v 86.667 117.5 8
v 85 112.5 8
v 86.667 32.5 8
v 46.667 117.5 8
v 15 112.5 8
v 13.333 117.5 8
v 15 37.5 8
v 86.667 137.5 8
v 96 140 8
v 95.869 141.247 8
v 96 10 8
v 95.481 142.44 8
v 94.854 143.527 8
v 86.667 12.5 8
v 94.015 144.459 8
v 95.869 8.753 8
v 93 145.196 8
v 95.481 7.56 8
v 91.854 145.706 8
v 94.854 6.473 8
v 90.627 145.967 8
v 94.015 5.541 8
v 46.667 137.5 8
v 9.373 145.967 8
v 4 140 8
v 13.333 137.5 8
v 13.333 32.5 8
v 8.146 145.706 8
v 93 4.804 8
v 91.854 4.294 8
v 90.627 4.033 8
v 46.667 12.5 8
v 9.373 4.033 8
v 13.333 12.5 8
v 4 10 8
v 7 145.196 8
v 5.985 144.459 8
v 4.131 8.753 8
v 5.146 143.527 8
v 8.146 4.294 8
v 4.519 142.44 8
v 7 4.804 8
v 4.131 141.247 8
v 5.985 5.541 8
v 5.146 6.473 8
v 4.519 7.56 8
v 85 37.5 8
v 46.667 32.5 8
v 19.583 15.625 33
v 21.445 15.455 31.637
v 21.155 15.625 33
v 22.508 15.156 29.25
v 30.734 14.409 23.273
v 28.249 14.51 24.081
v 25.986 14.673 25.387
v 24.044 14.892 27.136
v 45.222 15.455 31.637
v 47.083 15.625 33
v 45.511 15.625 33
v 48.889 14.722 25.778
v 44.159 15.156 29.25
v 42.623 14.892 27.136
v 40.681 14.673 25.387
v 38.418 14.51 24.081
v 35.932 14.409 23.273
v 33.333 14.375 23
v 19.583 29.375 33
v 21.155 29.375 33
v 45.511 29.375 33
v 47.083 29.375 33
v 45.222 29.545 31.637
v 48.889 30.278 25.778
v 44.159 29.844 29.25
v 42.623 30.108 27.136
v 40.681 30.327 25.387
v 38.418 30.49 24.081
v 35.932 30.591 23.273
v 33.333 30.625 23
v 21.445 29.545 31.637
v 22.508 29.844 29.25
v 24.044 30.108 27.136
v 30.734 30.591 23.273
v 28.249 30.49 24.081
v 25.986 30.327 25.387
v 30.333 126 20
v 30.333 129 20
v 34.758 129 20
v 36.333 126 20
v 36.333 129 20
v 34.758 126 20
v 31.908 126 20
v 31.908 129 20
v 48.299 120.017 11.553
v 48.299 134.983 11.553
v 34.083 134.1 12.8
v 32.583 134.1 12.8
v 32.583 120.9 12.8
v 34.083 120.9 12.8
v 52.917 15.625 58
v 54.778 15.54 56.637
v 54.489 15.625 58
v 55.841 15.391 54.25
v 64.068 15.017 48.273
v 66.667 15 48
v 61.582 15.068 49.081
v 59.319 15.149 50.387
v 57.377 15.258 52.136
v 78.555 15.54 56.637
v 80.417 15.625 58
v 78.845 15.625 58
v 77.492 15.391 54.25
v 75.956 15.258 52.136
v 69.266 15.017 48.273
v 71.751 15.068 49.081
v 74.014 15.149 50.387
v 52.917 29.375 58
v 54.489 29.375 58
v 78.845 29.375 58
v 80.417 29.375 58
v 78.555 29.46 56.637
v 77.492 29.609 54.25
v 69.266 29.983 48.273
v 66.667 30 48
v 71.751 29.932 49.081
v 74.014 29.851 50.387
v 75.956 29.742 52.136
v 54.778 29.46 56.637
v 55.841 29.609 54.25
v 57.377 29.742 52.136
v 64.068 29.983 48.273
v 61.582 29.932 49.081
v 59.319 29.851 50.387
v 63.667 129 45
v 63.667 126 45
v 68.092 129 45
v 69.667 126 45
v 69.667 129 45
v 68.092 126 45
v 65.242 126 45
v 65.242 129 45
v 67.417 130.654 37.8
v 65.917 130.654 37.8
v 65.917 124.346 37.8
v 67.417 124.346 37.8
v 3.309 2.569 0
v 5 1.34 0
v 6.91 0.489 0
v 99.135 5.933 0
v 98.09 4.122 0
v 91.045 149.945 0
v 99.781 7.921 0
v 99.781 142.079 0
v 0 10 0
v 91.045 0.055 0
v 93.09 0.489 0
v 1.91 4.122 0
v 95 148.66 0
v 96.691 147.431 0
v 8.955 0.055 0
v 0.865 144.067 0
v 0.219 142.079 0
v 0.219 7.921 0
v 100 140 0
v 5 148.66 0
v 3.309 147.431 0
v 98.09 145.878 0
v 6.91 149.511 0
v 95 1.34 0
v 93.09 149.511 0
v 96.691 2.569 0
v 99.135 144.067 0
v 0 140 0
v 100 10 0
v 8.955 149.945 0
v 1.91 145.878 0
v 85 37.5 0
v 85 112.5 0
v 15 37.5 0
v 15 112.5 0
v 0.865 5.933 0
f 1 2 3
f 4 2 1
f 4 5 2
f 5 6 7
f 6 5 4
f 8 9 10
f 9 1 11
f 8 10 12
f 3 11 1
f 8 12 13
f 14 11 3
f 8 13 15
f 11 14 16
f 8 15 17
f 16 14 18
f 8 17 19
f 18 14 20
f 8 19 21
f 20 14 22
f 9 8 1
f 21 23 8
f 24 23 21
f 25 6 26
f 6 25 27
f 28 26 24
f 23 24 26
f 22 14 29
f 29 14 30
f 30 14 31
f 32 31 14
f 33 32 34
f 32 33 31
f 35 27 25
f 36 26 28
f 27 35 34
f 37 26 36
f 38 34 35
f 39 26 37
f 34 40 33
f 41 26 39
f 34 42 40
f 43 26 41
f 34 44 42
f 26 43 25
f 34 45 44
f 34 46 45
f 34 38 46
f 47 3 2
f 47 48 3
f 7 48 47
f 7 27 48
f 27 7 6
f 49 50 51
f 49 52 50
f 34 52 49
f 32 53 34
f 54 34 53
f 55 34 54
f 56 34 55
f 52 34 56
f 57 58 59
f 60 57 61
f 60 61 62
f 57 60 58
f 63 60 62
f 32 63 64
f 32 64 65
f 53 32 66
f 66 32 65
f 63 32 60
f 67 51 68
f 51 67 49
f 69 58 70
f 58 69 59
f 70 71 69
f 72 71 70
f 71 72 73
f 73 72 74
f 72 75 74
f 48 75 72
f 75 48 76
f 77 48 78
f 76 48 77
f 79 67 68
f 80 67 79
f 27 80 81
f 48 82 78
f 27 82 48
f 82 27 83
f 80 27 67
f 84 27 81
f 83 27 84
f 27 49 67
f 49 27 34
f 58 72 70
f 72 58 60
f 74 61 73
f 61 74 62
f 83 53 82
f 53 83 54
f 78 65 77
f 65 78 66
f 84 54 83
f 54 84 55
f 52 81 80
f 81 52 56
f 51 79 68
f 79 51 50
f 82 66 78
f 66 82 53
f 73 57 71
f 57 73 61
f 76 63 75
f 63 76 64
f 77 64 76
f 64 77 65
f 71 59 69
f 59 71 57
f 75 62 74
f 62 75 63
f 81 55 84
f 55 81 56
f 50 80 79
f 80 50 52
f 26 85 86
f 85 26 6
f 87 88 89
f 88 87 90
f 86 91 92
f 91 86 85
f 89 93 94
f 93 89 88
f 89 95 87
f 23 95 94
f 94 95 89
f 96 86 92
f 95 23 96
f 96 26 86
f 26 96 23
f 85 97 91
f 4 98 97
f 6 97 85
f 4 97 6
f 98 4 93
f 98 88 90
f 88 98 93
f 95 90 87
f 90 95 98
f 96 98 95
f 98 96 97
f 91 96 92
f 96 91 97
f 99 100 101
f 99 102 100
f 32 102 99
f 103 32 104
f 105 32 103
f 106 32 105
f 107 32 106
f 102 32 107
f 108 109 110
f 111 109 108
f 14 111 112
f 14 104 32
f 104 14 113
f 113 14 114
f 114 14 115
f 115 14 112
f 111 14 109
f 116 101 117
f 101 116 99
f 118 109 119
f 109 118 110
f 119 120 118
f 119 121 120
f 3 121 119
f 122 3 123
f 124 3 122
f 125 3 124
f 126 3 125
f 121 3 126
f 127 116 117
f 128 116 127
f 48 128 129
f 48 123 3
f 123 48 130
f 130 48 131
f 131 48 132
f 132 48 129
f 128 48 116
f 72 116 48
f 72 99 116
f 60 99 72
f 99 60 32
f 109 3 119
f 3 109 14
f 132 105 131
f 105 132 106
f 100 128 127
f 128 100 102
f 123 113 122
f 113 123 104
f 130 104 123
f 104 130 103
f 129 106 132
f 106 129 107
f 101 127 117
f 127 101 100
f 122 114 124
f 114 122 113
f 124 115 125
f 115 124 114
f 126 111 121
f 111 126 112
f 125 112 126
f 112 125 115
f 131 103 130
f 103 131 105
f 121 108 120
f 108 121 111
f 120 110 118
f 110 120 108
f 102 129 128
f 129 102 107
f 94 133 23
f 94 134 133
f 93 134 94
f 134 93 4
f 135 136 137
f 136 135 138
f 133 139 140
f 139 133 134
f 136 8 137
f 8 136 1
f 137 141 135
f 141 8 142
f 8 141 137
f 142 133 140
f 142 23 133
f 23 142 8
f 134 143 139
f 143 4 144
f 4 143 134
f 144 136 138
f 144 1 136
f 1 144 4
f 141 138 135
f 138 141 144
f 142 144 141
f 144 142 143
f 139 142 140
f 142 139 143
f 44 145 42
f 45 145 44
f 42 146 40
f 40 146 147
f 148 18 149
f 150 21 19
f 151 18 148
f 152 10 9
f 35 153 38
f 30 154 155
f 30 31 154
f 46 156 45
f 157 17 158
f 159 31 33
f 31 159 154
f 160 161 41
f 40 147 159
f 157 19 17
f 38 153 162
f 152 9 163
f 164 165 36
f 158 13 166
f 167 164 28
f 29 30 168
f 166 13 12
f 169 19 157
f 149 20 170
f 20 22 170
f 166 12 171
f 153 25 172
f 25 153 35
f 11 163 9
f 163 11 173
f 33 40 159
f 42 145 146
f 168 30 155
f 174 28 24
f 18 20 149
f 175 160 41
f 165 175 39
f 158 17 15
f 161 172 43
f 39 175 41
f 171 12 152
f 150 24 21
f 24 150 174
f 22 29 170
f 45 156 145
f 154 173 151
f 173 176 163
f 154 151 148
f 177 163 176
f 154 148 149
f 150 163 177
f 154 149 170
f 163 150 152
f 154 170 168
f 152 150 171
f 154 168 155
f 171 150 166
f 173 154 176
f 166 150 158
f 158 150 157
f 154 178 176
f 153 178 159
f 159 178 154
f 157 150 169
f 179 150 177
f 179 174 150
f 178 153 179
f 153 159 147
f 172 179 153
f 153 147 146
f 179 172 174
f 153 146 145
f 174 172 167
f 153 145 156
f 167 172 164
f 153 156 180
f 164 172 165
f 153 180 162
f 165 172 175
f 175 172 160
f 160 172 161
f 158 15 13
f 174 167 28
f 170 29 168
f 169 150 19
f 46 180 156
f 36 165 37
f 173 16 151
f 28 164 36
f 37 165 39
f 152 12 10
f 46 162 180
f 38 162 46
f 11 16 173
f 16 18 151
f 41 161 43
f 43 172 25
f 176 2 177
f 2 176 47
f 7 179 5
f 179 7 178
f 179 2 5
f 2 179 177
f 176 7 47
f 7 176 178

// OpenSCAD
// The Nick Shabazz Parametric Knife Display Stand
// Set the parameters below, and you're off
// All values below in millimeters
// Open this using OpenSCAD to modify or render - https://openscad.org/
// Nick Shabazz - 2024

// Length in mm (perpendicular to the knives)
blength=100;
// Width in mm (parallel to the knives)
bwidth=150;
// Thickness in mm of the base (8mm is reasonable)
bthiccness=8;
// Radius in mm at base of the base (10mm is reasonable)
bhullrad1=10;
// Radius in mm at top of the base (for tapering base, for untapered, make the same value as above) (6mm is reasonable)
bhullrad2=6;
// Increase in height from tier to tier in mm (sets the difference between each level of knife, as well as the height of the first layer) (25mm is reasonable)
handleheightdiff=25;
// Distance in mm between the top of the handle rest and the top of the blade rest (13mm is reasonable)
handletobladefall=13;
// Diameter of the handle rest in mm (25mm is reasonable)
handlediameter=25;
// Blade Notch Depth in mm (how deep the notch for the blade is) (8mm is reasonable)
bladenotchdepth=8;
// Blade Notch Width in mm (how wide the top of the notch for the blade is) (3mm is reasonable)
bladenotchwidth=3;
// Position of the supports in terms of width (e.g. 0.2 will put it at 20% and 80% of the width) of the base
supportpositionwidth=0.15;
// Width of the supports in mm (20mm is reasonable)
supportwidth=20;

// Number of knives
knifenum=2;

// Defines the length of each support piece in terms of the overall length of the base
supportlength=(0.8*blength)/knifenum;
// No need to modify this bit, it just defines the position of the supports parametrically
righthandlepos=(1-supportpositionwidth)*bwidth;
rightbladepos=supportpositionwidth*bwidth;
lefthandlepos=supportpositionwidth*bwidth;
leftbladepos=(1-supportpositionwidth)*bwidth;

// To put the handle on the left, change handleSide below to "left"
handleSide="right";

//No need to modify, this checks for a handle side switch to left
test=handleSide=="left";
handlepos=test ? righthandlepos : lefthandlepos;
bladepos=test ? rightbladepos : leftbladepos;

// This creates the base with rounded edges
module baseshapehull(length, width, thiccness, hullrad1, hullrad2) {
    difference() {
    hull(){
        // Creates a hull around four tapered cylinders
     translate([hullrad1,hullrad1,0]){cylinder(thiccness,hullrad1,hullrad2);};
     translate([length-hullrad1,width-hullrad1,0]){cylinder(thiccness,hullrad1,hullrad2);};
     translate([hullrad1,width-hullrad1,0]){cylinder(thiccness,hullrad1,hullrad2);};
     translate([length-hullrad1,hullrad1,0]){cylinder(thiccness,hullrad1,hullrad2);};
            };
            // Comment out the next line to print a solid base, without the hole
     translate([length*0.15,width*0.25,-10]) {cube([length*0.7, bwidth*0.5, 100]);};
 };};
// This creates a holder with a round cutout for handles           
module handleholder(supportlength, supportwidth, height, handlediameter) {
    toplength=(handlediameter*1.1);
    taperpercent=toplength/supportlength;
    difference() {
        linear_extrude(height = height, twist = 0, scale = taperpercent, slices = 200)
            square([supportwidth,supportlength], center=true);
        translate([0,0,height+0.1*handlediameter])rotate([0,90,0])cylinder(h=100,d=handlediameter, center=true);

    }
}
// This creates a holder with a notched cutout for blades
module bladeholder(supportlength, supportwidth, height, bladenotchdepth,bladenotchwidth, handlediameter) {
    toplength=(bladenotchwidth*2);
    taperpercent=toplength/supportlength;

    difference() {
        linear_extrude(height = height, twist = 0, scale = taperpercent, slices = 200) square([supportlength, supportwidth], center=true);
        translate([0,0,height+0.1*bladenotchdepth])rotate([0,180,0])linear_extrude(height = bladenotchdepth, twist = 0, scale = 0.5, slices = 200)
            square([bladenotchwidth,1000], center=true);

    }
}

//If you'd like to make a sword holder with just blades, then replace the two handle-holders with blade holders.
// Similarly, this makes a pen holder if you change the handletobladefall and then replace with two handleholders
baselengthoffset=blength/(1+knifenum);
union(){
    for (knifeid=[1:knifenum]){
        knifeoffset=knifeid*baselengthoffset;
        knifeheight=(knifeid*handleheightdiff);
        bladeheight=knifeheight-handletobladefall;
translate([knifeoffset,handlepos,bthiccness])rotate([0,0,90])handleholder(supportlength,supportwidth,knifeheight,handlediameter);
        translate([knifeoffset,bladepos,bthiccness])rotate([0,0,0])bladeholder(supportlength,supportwidth,bladeheight,bladenotchdepth,bladenotchwidth, handlediameter);
    };
    baseshapehull(blength,bwidth,bthiccness,bhullrad1,bhullrad2);
};
